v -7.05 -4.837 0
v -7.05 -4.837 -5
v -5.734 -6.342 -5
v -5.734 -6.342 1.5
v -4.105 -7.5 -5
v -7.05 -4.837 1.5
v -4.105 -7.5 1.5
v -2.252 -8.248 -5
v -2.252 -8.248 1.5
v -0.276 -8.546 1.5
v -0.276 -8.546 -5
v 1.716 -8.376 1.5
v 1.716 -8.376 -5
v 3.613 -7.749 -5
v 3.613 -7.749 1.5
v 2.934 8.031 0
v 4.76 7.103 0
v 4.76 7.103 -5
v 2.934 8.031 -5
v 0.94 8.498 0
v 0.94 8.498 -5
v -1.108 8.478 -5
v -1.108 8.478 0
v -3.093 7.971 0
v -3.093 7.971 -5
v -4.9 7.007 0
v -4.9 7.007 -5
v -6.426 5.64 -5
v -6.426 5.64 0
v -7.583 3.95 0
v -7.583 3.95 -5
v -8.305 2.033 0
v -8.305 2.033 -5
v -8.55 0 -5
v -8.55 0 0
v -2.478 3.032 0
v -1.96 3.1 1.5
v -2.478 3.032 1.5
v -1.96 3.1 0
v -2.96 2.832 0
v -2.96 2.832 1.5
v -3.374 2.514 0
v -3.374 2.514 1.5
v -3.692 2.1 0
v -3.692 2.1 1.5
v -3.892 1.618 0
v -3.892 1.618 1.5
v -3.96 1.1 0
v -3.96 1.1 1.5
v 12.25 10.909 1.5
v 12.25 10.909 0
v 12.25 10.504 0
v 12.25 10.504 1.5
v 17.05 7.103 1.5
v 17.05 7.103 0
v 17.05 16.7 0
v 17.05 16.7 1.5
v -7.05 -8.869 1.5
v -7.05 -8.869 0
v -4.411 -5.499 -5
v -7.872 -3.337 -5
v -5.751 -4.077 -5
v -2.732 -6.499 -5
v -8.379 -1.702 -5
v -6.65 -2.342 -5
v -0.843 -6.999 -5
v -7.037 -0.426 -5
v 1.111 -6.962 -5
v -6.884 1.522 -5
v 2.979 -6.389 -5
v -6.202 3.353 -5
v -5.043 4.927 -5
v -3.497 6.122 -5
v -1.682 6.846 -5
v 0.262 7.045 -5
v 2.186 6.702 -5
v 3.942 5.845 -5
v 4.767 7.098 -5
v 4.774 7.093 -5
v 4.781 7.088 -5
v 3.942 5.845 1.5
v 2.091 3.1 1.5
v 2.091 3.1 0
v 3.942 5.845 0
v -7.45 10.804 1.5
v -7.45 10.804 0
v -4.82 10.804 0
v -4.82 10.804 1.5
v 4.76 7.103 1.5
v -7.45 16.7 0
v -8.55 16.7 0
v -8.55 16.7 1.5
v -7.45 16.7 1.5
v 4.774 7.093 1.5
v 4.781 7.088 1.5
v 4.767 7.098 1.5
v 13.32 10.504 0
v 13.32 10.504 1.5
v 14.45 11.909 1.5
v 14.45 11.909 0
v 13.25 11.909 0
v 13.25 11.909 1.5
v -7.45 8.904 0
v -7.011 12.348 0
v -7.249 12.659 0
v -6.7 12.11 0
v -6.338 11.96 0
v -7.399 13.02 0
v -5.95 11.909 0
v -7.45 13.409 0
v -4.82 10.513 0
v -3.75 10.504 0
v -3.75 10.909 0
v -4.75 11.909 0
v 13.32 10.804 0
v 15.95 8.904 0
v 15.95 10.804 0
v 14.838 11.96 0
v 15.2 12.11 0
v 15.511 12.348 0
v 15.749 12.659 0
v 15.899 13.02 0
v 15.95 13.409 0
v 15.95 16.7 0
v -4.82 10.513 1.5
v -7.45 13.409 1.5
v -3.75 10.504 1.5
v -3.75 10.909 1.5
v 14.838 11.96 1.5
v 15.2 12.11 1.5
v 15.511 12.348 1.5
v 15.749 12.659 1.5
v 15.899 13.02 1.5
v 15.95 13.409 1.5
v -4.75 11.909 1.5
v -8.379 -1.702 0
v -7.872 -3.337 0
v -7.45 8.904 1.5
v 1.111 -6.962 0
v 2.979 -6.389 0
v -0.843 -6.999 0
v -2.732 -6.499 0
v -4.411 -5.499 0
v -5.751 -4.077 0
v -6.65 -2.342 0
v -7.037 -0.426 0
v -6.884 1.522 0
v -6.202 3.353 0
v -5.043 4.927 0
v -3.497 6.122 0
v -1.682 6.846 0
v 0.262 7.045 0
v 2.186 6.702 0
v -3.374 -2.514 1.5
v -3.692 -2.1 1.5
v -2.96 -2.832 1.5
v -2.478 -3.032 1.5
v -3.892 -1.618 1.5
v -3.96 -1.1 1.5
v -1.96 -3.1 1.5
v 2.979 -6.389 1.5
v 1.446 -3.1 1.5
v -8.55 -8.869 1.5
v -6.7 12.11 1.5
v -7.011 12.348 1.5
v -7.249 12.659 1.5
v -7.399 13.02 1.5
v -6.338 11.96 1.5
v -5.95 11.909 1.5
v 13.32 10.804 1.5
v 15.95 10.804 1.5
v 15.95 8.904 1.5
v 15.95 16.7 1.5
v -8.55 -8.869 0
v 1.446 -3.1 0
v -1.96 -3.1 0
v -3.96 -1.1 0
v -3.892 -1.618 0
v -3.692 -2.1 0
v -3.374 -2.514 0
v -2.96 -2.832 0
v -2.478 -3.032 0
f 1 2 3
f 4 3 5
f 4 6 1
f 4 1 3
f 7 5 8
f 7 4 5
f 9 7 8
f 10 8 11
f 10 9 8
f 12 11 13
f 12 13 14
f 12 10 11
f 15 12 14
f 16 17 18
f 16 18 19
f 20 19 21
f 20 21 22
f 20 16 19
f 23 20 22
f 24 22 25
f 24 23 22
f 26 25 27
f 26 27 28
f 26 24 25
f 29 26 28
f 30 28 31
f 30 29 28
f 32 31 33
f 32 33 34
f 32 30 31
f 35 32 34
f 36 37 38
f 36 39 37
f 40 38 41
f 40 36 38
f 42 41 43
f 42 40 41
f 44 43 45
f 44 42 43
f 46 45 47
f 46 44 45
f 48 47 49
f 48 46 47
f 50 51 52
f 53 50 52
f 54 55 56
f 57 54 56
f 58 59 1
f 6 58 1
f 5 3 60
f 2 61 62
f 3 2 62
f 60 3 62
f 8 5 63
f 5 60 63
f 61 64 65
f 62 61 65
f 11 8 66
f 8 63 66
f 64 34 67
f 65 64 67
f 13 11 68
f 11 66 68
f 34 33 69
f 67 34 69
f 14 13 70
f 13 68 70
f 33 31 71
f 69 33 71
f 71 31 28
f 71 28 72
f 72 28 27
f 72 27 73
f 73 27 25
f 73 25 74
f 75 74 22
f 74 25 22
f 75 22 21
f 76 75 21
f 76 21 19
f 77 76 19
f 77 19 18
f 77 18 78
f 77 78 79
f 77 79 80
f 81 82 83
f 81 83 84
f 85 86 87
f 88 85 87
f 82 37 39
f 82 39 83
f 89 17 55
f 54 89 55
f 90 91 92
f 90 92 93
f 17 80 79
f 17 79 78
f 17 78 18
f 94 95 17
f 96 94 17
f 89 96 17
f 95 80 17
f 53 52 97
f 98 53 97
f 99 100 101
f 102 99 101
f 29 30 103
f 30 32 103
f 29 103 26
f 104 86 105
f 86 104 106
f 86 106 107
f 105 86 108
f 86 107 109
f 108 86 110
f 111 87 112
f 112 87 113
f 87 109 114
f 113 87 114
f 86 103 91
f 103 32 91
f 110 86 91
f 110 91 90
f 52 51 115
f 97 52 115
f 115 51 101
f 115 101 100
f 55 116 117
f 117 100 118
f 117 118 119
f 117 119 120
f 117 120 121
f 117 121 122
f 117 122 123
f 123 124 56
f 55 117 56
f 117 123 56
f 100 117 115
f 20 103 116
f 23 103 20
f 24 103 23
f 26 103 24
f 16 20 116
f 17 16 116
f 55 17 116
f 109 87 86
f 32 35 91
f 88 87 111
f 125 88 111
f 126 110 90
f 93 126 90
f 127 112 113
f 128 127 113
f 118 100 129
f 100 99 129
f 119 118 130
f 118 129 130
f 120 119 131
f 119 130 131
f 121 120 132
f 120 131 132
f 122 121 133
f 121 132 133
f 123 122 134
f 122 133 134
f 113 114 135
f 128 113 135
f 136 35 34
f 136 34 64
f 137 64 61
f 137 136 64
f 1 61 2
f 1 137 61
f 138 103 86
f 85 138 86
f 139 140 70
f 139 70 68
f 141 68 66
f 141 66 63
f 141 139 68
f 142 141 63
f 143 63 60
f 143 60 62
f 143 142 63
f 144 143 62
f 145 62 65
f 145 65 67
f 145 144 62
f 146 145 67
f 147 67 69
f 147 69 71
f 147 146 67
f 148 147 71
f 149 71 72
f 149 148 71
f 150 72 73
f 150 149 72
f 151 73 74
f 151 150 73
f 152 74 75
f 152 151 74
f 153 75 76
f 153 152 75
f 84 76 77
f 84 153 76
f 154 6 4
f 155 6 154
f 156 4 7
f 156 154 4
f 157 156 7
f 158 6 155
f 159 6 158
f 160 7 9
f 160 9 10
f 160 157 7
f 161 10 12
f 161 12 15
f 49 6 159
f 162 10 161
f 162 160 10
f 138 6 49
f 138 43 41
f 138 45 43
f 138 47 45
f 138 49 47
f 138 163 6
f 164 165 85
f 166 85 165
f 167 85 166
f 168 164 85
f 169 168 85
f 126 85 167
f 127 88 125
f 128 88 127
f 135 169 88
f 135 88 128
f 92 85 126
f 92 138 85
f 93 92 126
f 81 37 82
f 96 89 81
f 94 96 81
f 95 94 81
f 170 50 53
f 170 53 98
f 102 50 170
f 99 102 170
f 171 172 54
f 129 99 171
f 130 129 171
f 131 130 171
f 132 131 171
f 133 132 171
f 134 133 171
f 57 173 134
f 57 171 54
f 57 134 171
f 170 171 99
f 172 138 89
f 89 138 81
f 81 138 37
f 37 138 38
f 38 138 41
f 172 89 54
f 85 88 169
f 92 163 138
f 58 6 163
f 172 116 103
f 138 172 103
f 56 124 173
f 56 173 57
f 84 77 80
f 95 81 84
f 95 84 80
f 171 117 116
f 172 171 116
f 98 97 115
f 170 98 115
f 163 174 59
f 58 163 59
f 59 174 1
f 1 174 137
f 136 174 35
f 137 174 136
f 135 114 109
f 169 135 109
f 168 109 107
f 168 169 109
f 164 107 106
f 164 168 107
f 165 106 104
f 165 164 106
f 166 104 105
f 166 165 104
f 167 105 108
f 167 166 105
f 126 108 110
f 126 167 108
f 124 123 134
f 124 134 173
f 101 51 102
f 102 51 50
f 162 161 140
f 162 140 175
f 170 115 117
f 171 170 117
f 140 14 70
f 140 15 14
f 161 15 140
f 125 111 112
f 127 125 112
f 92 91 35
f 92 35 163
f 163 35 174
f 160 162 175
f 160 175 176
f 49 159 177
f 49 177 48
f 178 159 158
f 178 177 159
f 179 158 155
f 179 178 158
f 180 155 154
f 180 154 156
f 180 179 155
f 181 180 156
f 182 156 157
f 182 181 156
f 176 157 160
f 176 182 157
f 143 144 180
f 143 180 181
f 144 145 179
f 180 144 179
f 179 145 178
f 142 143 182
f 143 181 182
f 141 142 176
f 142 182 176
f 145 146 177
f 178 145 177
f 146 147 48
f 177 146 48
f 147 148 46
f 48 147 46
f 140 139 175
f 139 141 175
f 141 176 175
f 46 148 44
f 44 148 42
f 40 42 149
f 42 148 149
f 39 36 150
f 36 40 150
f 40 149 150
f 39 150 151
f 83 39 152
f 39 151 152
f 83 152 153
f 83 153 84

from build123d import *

# Parameters (mm, degrees)
F0_W     = 1.1
F0_H     = 4.7914452539
F1_DEPTH = 1.5
F2_SIZE  = 1
F3_R     = 1.5
F5_DEPTH = 1.5
F6_DEPTH = 5
F7_R     = 2


# Not quite as in the source:
# - a feature names something its author has since deleted; it is built from what else it names


with BuildPart() as f1:
    # F0 (on Top) → F1 (new body)
    with BuildSketch(Plane.XY):
        with BuildLine():
            ThreePointArc((-8.55, 0), (-4.0253321977, 7.5431558845), (4.7597545494, 7.1026218138))
            Line((4.7597545494, 7.1026218138), (4.7907789053, 7.1026218138))
            Line((4.7907789053, 7.1026218138), (6.0061305772, 8.9044547655))
            Line((6.0061305772, 8.9044547655), (-7.45, 8.9044547655))
            Line((-7.45, 8.9044547655), (-7.45, 10.8044547655))
            Line((-7.45, 10.8044547655), (-4.820069465, 10.8044547655))
            Line((-4.820069465, 10.8044547655), (-4.820069465, 10.5132658899))
            Line((-4.820069465, 10.5132658899), (-3.75, 10.5044547655))
            Line((-3.75, 10.5044547655), (-3.75, 10.8044547655))
            Line((-3.75, 10.8044547655), (-3.75, 11.9085547461))
            Line((-3.75, 11.9085547461), (-7.45, 11.9085547461))
            Line((-7.45, 11.9085547461), (-8.55, 11.9085547461))
            Line((-8.55, 11.9085547461), (-8.55, 10.5085547461))
            Line((-8.55, 10.5085547461), (-8.55, 0))
        make_face()
        with BuildLine():
            Line((-7.05, -8.869094649), (-7.05, -4.837354649))
            ThreePointArc((-7.05, -4.837354649), (-8.1663945533, -2.5322914524), (-8.55, 0))
            Line((-8.55, 0), (-8.55, -8.869094649))
            Line((-8.55, -8.869094649), (-7.05, -8.869094649))
        make_face()
        with BuildLine():
            ThreePointArc((2.9794587453, -6.3894698986), (-7.0282672028, 0.5531366249), (3.9423099695, 5.8447148865))
            Line((3.9423099695, 5.8447148865), (4.7810993247, 7.0882712453))
            ThreePointArc((4.7810993247, 7.0882712453), (4.7704323333, 7.0954545558), (4.7597545494, 7.1026218138))
            ThreePointArc((4.7597545494, 7.1026218138), (-4.0253321977, 7.5431558845), (-8.55, 0))
            ThreePointArc((-8.55, 0), (-8.1663945533, -2.5322914524), (-7.05, -4.837354649))
            ThreePointArc((-7.05, -4.837354649), (-2.2520876458, -8.248066515), (3.6133861379, -7.7489315792))
            Line((3.6133861379, -7.7489315792), (2.9794587453, -6.3894698986))
        make_face()
        Polygon((6.0061305772, 8.9044547655), (4.7907789053, 7.1026218138), (15.4494866027, 7.1026218138), (17.05, 7.1026218138), (17.05, 11.9085547461), (15.95, 11.9085547461), (12.25, 11.9085547461), (12.25, 10.8044547655), (12.25, 10.5044547655), (13.32, 10.5044547655), (13.32, 10.8044547655), (15.95, 10.8044547655), (15.95, 8.9044547655), align=None)
        with Locations((-8, 14.3042773731)):
            Rectangle(F0_W, F0_H)
        with Locations((16.5, 14.3042773731)):
            Rectangle(F0_W, F0_H)
    extrude(amount=F1_DEPTH)

    # F2
    f2_edges = [f1.edges().sort_by_distance(p)[0] for p in [
        (-3.75, 11.908555, 0.75),
        (12.25, 11.908555, 0.75),
    ]]
    chamfer(f2_edges, length=F2_SIZE)

    # F3
    f3_edges = [f1.edges().sort_by_distance(p)[0] for p in [
        (-7.45, 11.908555, 0.75),
        (15.95, 11.908555, 0.75),
    ]]
    fillet(f3_edges, radius=F3_R)

    # F4 (on face) → F5 (join)
    with BuildSketch(Plane.XY.offset(1.5)):
        with BuildLine():
            Line((2.0909764022, 3.1), (3.9423099695, 5.8447148865))
            ThreePointArc((3.9423099695, 5.8447148865), (-7.0282672028, 0.5531366249), (2.9794587453, -6.3894698986))
            Line((2.9794587453, -6.3894698986), (1.4455537403, -3.1))
            Line((1.4455537403, -3.1), (-3.96, -3.1))
            Line((-3.96, -3.1), (-3.96, 3.1))
            Line((-3.96, 3.1), (2.0909764022, 3.1))
        make_face()
    extrude(amount=-F5_DEPTH)

    # F0 (on Top) → F6 (join)
    with BuildSketch(Plane.XY):
        with BuildLine():
            ThreePointArc((2.9794587453, -6.3894698986), (-7.0282672028, 0.5531366249), (3.9423099695, 5.8447148865))
            Line((3.9423099695, 5.8447148865), (4.7810993247, 7.0882712453))
            ThreePointArc((4.7810993247, 7.0882712453), (4.7704323333, 7.0954545558), (4.7597545494, 7.1026218138))
            ThreePointArc((4.7597545494, 7.1026218138), (-4.0253321977, 7.5431558845), (-8.55, 0))
            ThreePointArc((-8.55, 0), (-8.1663945533, -2.5322914524), (-7.05, -4.837354649))
            ThreePointArc((-7.05, -4.837354649), (-2.2520876458, -8.248066515), (3.6133861379, -7.7489315792))
            Line((3.6133861379, -7.7489315792), (2.9794587453, -6.3894698986))
        make_face()
    extrude(amount=-F6_DEPTH)

    # F7
    f7_edges = [f1.edges().sort_by_distance(p)[0] for p in [
        (-3.96, 3.1, 0.75),
        (-3.96, -3.1, 0.75),
    ]]
    fillet(f7_edges, radius=F7_R)


solid = f1.part
